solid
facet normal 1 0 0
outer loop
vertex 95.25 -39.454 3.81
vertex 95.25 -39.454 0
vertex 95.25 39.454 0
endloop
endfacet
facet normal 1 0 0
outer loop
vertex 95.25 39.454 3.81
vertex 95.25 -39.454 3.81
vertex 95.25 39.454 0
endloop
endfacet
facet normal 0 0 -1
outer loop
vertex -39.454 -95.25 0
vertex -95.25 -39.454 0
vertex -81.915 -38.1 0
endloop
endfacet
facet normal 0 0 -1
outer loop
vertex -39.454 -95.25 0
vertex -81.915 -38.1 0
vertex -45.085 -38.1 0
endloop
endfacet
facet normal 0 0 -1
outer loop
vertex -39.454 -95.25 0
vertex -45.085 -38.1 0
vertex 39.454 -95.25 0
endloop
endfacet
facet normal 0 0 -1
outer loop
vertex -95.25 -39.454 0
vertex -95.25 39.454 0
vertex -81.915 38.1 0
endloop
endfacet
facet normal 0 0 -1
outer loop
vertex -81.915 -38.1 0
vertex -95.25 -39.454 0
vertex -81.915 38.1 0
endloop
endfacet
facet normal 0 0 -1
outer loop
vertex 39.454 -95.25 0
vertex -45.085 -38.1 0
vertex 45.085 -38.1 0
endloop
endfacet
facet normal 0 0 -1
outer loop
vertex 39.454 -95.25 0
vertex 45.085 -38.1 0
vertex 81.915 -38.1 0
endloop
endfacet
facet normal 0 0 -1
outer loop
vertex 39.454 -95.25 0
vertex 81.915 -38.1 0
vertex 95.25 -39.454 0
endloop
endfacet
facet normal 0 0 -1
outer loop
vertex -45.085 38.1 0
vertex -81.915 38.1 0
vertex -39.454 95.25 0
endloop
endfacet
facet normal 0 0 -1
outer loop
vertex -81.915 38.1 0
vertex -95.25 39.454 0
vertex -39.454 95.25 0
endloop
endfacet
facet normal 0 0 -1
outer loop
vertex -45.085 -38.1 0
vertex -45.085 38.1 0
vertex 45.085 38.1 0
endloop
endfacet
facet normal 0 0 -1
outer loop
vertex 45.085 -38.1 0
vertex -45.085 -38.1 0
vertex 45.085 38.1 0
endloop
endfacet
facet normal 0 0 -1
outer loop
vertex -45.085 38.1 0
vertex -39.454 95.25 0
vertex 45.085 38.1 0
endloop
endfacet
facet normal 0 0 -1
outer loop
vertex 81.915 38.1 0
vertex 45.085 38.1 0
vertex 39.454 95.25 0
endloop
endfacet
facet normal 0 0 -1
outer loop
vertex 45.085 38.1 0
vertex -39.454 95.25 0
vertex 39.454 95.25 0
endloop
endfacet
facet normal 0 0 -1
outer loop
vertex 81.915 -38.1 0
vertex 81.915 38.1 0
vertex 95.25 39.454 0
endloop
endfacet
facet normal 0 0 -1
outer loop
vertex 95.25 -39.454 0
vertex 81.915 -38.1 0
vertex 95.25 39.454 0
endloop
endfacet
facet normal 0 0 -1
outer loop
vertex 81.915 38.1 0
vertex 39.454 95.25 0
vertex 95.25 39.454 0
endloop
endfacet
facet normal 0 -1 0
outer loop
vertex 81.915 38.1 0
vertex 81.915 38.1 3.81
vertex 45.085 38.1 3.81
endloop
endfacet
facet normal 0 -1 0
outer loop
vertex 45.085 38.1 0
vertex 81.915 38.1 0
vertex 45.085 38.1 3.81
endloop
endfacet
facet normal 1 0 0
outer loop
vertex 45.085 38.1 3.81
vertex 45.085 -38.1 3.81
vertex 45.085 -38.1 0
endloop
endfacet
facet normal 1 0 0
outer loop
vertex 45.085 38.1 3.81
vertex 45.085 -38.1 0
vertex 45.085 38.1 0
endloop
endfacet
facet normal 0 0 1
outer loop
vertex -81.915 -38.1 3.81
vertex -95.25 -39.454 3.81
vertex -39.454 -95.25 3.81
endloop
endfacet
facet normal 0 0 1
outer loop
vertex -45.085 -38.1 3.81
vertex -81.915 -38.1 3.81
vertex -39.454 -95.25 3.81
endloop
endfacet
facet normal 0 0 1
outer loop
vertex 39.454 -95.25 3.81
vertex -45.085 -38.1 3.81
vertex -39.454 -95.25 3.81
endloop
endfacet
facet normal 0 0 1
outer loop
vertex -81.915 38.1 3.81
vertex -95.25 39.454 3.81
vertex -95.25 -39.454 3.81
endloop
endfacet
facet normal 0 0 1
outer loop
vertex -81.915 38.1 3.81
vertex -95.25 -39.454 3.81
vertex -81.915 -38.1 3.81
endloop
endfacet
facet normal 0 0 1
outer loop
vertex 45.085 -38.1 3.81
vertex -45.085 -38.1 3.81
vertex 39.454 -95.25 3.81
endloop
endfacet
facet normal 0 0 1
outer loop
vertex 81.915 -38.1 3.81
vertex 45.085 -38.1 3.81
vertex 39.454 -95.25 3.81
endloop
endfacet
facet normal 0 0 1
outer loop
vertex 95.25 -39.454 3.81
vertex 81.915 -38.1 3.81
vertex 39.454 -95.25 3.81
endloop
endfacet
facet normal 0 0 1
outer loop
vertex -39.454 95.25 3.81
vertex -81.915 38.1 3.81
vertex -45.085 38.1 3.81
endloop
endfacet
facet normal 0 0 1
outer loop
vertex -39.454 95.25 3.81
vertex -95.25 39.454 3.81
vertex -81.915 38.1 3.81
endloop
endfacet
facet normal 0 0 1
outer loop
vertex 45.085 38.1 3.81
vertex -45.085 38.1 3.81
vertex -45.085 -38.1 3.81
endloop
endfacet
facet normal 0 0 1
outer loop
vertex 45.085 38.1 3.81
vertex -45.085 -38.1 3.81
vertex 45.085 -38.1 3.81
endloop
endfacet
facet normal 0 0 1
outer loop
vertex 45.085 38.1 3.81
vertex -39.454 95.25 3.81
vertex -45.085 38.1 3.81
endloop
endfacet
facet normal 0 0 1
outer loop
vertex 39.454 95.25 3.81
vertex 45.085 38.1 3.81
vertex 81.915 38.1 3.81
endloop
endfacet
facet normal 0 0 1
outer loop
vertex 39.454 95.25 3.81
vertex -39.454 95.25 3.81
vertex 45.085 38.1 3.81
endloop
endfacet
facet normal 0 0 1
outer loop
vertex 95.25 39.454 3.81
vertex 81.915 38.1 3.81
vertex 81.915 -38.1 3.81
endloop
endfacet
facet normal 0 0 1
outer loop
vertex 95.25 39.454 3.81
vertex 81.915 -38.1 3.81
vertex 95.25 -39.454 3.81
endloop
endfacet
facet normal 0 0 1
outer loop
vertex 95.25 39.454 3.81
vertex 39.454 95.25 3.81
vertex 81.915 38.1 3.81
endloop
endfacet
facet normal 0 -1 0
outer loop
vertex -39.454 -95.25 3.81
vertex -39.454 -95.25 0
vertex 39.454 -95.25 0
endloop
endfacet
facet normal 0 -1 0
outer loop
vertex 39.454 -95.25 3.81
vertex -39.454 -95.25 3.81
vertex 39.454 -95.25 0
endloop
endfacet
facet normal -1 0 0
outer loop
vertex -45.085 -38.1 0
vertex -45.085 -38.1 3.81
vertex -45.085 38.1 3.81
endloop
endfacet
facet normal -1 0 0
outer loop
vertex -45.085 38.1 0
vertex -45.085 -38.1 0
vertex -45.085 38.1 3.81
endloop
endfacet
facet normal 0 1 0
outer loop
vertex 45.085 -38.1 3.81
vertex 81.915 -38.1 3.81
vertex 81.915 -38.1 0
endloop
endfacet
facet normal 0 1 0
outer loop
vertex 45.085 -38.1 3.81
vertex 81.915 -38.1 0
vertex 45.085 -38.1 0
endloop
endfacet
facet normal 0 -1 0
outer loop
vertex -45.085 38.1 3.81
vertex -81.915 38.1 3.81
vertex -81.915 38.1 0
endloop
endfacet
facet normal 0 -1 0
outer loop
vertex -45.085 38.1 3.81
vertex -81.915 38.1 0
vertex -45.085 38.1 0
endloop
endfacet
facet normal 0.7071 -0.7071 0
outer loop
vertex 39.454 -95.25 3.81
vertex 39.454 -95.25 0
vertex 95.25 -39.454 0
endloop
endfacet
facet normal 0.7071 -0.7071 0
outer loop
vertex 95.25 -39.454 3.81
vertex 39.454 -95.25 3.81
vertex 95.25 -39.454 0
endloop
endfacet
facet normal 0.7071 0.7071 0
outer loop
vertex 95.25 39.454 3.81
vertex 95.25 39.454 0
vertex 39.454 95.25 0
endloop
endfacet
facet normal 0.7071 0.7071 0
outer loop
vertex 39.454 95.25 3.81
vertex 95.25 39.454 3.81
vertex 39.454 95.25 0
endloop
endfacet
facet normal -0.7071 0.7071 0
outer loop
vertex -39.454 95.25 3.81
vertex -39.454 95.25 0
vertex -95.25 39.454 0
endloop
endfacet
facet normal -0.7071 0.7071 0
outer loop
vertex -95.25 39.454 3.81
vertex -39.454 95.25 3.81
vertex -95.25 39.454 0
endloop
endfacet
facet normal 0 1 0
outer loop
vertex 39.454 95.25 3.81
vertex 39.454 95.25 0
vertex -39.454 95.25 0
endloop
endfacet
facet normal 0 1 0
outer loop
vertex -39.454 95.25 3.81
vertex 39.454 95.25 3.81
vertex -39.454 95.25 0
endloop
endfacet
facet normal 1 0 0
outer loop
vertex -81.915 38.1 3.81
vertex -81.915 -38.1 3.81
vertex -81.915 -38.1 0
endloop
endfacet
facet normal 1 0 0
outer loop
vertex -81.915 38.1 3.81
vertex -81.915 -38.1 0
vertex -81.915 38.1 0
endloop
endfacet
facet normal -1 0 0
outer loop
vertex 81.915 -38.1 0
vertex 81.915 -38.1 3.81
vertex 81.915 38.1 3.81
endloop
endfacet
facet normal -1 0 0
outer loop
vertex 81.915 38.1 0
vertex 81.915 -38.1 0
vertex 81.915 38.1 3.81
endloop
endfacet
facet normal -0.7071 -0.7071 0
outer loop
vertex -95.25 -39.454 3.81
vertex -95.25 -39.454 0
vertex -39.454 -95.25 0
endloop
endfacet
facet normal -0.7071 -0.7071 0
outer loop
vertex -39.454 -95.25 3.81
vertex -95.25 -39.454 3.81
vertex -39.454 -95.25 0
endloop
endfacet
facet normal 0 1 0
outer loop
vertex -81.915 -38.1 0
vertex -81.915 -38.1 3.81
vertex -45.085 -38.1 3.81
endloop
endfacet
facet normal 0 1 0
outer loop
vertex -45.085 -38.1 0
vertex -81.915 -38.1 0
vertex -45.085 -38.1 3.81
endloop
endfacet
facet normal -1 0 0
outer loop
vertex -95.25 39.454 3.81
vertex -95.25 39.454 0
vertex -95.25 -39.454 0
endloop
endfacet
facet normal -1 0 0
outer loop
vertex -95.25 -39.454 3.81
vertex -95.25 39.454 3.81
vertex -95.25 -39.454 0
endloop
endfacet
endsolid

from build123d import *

# Parameters (mm, degrees)
F1_DEPTH = 3.81
F2_W     = 36.83
F2_H     = 76.2
F3_DEPTH = 3.81


with BuildPart() as f1:
    # F0 (on Top) → F1 (new body)
    with BuildSketch(Plane.XY):
        Polygon((39.453842, -95.25), (95.25, -39.453842), (95.25, 39.453842), (39.453842, 95.25), (-39.453842, 95.25), (-95.25, 39.453842), (-95.25, -39.453842), (-39.453842, -95.25), align=None)
    extrude(amount=F1_DEPTH)

    # F2 (on face) → F3 (cut)
    with BuildSketch(Plane.XY.offset(3.81)):
        with Locations((-63.5, 0)):
            Rectangle(F2_W, F2_H)
    extrude(amount=-F3_DEPTH, mode=Mode.SUBTRACT)

    # F4: F1 across plane


with BuildPart() as f1_1:
    add(f1.part)
    add(f1.part.mirror(Plane.YZ), mode=Mode.INTERSECT)


solid = f1_1.part
